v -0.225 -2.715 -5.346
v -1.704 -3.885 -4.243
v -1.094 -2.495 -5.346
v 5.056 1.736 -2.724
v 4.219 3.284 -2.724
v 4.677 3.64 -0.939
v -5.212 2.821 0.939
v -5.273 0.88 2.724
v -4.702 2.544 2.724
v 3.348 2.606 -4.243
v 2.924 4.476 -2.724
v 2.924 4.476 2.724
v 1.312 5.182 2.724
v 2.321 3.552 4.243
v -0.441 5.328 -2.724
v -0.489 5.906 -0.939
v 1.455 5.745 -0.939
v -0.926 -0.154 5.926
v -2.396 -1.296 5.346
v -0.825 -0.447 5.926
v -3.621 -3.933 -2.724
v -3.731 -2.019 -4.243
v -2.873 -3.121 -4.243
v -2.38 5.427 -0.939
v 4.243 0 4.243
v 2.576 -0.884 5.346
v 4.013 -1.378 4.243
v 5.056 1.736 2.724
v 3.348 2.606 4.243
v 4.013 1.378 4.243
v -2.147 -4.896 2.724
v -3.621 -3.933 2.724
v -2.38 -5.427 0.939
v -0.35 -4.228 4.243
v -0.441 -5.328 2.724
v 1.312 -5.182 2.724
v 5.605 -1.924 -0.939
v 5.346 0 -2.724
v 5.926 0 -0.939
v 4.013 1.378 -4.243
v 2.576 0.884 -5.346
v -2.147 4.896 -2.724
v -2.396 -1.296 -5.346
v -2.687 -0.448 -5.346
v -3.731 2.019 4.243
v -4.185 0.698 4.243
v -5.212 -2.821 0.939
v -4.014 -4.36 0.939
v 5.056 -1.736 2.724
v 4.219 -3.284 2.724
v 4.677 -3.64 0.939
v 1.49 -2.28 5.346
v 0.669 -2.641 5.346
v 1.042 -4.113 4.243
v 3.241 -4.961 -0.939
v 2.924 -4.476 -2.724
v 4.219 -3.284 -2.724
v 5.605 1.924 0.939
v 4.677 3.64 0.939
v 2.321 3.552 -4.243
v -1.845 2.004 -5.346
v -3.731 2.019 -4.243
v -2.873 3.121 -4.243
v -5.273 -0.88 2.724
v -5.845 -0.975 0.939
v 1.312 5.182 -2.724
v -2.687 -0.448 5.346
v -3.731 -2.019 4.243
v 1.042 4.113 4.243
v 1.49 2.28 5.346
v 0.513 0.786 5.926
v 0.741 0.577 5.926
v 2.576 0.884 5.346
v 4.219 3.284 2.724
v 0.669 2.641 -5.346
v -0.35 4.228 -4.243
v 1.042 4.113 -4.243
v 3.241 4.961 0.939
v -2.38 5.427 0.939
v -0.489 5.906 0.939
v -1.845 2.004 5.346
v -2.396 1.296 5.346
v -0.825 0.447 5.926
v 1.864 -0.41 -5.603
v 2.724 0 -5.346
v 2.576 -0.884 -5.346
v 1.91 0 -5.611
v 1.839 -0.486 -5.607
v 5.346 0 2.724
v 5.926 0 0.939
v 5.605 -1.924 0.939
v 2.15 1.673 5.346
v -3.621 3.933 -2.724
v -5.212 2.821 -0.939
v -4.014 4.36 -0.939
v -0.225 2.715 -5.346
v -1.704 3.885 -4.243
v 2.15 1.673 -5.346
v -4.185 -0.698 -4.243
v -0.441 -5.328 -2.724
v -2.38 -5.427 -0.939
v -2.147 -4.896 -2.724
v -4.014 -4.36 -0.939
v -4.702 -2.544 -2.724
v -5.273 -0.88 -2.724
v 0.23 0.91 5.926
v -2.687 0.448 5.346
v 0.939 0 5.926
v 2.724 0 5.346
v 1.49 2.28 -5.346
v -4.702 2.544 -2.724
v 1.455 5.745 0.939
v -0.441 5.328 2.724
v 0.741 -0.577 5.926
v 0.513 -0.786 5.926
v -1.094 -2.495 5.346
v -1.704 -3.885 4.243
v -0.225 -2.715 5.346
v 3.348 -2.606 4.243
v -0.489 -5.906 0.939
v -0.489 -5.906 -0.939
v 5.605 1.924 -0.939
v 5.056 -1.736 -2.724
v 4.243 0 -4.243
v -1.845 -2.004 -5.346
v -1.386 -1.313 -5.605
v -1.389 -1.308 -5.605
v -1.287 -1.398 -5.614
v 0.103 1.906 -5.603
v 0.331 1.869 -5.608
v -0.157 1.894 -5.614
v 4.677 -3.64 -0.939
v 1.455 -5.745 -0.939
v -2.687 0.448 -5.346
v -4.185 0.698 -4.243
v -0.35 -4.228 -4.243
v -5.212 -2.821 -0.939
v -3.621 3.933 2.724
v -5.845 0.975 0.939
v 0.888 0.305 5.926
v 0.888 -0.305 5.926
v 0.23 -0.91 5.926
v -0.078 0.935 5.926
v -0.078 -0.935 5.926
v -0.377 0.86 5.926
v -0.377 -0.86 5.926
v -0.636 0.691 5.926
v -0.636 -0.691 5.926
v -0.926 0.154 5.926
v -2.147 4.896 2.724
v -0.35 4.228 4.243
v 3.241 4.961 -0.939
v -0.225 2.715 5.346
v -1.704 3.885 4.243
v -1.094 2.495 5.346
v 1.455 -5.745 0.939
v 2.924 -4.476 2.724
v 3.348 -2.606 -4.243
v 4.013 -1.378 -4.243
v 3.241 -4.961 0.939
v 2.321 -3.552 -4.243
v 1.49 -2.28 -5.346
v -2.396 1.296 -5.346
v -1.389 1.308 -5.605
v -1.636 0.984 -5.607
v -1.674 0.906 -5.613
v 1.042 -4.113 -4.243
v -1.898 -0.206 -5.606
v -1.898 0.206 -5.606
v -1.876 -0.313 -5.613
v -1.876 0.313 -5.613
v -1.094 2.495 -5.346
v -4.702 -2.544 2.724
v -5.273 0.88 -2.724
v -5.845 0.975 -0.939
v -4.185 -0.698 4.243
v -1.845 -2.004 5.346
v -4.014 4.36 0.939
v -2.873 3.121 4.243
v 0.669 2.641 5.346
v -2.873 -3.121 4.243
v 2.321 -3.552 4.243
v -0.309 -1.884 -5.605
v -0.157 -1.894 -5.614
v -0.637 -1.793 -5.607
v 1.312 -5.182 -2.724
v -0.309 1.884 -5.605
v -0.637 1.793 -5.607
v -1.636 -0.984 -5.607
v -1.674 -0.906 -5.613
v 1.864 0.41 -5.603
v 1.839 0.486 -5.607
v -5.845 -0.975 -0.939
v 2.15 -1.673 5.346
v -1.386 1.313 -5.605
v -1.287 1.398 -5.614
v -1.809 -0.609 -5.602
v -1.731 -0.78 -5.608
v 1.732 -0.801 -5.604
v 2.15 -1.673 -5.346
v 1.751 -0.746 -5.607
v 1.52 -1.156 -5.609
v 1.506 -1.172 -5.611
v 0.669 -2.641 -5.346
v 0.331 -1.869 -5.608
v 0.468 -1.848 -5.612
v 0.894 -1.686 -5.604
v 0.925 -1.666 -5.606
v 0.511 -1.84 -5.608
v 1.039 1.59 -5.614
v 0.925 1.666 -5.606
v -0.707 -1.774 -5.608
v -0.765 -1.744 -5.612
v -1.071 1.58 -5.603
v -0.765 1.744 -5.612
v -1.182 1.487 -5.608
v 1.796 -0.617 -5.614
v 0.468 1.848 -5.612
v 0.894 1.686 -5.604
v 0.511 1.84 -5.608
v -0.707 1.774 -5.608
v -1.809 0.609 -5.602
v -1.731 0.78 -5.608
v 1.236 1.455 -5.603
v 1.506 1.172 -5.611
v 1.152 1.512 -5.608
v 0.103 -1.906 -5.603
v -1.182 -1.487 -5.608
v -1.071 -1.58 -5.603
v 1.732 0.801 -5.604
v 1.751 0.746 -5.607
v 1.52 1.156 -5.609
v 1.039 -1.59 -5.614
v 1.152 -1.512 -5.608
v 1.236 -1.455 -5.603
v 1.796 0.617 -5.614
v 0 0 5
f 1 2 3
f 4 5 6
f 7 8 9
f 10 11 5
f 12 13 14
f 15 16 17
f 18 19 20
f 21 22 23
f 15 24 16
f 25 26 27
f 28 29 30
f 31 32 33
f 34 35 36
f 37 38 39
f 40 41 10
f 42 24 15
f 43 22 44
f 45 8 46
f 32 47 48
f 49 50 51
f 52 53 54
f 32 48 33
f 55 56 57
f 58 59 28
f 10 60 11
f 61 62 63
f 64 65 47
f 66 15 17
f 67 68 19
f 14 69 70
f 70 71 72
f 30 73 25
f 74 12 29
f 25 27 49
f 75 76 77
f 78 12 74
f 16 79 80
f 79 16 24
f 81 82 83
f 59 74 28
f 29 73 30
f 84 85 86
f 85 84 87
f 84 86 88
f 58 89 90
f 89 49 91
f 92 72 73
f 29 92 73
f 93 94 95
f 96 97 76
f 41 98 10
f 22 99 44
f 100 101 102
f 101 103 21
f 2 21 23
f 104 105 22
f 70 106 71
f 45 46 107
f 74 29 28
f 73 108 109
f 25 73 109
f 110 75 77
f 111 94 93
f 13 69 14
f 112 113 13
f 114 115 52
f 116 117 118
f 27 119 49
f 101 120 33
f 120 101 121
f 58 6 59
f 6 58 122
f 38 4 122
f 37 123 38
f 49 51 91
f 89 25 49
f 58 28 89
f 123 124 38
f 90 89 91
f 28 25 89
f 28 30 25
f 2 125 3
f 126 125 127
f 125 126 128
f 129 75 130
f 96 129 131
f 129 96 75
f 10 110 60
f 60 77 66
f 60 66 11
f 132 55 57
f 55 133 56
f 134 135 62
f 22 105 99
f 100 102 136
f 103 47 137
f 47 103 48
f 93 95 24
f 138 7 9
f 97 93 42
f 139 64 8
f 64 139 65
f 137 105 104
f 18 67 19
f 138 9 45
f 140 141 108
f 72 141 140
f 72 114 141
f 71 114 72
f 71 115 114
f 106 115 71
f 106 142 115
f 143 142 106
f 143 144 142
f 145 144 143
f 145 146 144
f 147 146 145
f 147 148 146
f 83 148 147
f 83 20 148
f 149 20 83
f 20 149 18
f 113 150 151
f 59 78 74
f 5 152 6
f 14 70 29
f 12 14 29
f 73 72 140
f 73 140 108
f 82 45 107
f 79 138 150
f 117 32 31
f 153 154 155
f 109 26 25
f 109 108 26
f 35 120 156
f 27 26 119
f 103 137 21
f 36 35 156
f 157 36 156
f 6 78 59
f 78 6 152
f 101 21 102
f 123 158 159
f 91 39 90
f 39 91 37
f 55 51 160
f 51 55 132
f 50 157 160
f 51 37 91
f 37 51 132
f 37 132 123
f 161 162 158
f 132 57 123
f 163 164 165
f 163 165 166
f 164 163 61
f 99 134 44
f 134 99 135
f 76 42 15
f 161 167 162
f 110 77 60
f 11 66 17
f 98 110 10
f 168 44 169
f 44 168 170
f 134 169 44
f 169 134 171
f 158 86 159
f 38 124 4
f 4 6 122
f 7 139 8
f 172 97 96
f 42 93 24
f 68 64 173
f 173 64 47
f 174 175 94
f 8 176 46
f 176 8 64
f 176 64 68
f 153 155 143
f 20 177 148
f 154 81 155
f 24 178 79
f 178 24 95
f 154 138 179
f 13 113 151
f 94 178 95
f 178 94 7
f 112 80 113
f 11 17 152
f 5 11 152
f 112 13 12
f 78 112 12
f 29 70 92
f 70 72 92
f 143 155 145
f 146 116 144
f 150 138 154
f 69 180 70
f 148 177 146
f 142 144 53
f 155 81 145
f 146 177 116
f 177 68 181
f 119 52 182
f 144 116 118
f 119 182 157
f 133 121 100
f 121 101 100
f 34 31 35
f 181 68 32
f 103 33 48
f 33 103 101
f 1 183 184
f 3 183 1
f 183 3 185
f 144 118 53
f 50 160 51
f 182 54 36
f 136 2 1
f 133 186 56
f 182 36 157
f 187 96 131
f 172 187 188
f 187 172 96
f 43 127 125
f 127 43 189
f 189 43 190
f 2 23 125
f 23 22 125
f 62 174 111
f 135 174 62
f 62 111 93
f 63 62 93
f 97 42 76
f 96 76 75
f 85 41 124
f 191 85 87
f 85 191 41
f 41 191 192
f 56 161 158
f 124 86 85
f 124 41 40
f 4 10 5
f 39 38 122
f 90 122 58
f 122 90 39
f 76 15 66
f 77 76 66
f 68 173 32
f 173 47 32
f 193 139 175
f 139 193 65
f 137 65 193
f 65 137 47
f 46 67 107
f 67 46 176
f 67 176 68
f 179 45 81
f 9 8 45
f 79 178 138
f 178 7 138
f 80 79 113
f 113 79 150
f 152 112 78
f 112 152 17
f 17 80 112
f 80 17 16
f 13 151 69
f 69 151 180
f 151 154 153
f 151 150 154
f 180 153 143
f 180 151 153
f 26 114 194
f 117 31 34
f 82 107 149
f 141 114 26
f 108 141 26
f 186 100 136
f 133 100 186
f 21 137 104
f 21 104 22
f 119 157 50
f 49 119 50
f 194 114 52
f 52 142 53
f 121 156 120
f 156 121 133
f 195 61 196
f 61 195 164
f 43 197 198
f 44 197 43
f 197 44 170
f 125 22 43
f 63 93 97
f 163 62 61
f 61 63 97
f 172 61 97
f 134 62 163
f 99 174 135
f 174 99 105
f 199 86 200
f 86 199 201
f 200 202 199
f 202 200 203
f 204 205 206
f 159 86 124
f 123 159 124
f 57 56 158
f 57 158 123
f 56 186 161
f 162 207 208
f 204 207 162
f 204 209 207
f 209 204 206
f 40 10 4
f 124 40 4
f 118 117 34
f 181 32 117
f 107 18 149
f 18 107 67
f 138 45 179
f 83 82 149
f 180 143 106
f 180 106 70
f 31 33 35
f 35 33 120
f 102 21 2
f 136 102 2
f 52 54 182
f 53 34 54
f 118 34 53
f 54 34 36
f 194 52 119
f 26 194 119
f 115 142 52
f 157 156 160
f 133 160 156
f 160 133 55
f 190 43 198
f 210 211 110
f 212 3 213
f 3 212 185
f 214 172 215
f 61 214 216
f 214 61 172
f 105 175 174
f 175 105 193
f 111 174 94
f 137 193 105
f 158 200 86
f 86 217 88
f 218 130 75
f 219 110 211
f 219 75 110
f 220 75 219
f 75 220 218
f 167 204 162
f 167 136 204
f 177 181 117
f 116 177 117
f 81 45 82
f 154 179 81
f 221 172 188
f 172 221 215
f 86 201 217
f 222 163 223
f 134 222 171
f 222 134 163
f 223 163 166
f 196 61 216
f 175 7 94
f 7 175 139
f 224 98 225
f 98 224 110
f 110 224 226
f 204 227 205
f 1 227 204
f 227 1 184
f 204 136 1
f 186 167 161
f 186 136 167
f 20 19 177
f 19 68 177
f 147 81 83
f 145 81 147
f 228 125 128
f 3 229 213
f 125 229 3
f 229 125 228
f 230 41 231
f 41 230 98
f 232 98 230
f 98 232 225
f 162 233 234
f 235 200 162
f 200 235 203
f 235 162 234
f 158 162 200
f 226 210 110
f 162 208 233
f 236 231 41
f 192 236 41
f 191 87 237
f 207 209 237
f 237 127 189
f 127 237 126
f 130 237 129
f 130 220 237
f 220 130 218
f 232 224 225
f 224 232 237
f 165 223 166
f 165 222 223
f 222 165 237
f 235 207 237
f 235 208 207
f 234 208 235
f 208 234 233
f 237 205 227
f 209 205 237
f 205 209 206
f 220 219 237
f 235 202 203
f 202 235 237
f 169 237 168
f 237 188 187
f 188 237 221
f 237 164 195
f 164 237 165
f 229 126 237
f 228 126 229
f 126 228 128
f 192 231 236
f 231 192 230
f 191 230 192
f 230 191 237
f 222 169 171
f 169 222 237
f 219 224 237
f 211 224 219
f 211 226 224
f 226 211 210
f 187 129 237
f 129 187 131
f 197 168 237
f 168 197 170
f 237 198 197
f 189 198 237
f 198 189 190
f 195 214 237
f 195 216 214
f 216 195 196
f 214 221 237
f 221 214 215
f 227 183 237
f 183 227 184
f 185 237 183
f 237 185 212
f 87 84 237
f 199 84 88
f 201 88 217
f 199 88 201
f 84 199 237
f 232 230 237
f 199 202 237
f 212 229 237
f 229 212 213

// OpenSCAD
render(convexity=2)
difference() {
    sphere(d=12);
    translate([0,0,-45]) cylinder(d1=18,d2=0,h=50);
}
